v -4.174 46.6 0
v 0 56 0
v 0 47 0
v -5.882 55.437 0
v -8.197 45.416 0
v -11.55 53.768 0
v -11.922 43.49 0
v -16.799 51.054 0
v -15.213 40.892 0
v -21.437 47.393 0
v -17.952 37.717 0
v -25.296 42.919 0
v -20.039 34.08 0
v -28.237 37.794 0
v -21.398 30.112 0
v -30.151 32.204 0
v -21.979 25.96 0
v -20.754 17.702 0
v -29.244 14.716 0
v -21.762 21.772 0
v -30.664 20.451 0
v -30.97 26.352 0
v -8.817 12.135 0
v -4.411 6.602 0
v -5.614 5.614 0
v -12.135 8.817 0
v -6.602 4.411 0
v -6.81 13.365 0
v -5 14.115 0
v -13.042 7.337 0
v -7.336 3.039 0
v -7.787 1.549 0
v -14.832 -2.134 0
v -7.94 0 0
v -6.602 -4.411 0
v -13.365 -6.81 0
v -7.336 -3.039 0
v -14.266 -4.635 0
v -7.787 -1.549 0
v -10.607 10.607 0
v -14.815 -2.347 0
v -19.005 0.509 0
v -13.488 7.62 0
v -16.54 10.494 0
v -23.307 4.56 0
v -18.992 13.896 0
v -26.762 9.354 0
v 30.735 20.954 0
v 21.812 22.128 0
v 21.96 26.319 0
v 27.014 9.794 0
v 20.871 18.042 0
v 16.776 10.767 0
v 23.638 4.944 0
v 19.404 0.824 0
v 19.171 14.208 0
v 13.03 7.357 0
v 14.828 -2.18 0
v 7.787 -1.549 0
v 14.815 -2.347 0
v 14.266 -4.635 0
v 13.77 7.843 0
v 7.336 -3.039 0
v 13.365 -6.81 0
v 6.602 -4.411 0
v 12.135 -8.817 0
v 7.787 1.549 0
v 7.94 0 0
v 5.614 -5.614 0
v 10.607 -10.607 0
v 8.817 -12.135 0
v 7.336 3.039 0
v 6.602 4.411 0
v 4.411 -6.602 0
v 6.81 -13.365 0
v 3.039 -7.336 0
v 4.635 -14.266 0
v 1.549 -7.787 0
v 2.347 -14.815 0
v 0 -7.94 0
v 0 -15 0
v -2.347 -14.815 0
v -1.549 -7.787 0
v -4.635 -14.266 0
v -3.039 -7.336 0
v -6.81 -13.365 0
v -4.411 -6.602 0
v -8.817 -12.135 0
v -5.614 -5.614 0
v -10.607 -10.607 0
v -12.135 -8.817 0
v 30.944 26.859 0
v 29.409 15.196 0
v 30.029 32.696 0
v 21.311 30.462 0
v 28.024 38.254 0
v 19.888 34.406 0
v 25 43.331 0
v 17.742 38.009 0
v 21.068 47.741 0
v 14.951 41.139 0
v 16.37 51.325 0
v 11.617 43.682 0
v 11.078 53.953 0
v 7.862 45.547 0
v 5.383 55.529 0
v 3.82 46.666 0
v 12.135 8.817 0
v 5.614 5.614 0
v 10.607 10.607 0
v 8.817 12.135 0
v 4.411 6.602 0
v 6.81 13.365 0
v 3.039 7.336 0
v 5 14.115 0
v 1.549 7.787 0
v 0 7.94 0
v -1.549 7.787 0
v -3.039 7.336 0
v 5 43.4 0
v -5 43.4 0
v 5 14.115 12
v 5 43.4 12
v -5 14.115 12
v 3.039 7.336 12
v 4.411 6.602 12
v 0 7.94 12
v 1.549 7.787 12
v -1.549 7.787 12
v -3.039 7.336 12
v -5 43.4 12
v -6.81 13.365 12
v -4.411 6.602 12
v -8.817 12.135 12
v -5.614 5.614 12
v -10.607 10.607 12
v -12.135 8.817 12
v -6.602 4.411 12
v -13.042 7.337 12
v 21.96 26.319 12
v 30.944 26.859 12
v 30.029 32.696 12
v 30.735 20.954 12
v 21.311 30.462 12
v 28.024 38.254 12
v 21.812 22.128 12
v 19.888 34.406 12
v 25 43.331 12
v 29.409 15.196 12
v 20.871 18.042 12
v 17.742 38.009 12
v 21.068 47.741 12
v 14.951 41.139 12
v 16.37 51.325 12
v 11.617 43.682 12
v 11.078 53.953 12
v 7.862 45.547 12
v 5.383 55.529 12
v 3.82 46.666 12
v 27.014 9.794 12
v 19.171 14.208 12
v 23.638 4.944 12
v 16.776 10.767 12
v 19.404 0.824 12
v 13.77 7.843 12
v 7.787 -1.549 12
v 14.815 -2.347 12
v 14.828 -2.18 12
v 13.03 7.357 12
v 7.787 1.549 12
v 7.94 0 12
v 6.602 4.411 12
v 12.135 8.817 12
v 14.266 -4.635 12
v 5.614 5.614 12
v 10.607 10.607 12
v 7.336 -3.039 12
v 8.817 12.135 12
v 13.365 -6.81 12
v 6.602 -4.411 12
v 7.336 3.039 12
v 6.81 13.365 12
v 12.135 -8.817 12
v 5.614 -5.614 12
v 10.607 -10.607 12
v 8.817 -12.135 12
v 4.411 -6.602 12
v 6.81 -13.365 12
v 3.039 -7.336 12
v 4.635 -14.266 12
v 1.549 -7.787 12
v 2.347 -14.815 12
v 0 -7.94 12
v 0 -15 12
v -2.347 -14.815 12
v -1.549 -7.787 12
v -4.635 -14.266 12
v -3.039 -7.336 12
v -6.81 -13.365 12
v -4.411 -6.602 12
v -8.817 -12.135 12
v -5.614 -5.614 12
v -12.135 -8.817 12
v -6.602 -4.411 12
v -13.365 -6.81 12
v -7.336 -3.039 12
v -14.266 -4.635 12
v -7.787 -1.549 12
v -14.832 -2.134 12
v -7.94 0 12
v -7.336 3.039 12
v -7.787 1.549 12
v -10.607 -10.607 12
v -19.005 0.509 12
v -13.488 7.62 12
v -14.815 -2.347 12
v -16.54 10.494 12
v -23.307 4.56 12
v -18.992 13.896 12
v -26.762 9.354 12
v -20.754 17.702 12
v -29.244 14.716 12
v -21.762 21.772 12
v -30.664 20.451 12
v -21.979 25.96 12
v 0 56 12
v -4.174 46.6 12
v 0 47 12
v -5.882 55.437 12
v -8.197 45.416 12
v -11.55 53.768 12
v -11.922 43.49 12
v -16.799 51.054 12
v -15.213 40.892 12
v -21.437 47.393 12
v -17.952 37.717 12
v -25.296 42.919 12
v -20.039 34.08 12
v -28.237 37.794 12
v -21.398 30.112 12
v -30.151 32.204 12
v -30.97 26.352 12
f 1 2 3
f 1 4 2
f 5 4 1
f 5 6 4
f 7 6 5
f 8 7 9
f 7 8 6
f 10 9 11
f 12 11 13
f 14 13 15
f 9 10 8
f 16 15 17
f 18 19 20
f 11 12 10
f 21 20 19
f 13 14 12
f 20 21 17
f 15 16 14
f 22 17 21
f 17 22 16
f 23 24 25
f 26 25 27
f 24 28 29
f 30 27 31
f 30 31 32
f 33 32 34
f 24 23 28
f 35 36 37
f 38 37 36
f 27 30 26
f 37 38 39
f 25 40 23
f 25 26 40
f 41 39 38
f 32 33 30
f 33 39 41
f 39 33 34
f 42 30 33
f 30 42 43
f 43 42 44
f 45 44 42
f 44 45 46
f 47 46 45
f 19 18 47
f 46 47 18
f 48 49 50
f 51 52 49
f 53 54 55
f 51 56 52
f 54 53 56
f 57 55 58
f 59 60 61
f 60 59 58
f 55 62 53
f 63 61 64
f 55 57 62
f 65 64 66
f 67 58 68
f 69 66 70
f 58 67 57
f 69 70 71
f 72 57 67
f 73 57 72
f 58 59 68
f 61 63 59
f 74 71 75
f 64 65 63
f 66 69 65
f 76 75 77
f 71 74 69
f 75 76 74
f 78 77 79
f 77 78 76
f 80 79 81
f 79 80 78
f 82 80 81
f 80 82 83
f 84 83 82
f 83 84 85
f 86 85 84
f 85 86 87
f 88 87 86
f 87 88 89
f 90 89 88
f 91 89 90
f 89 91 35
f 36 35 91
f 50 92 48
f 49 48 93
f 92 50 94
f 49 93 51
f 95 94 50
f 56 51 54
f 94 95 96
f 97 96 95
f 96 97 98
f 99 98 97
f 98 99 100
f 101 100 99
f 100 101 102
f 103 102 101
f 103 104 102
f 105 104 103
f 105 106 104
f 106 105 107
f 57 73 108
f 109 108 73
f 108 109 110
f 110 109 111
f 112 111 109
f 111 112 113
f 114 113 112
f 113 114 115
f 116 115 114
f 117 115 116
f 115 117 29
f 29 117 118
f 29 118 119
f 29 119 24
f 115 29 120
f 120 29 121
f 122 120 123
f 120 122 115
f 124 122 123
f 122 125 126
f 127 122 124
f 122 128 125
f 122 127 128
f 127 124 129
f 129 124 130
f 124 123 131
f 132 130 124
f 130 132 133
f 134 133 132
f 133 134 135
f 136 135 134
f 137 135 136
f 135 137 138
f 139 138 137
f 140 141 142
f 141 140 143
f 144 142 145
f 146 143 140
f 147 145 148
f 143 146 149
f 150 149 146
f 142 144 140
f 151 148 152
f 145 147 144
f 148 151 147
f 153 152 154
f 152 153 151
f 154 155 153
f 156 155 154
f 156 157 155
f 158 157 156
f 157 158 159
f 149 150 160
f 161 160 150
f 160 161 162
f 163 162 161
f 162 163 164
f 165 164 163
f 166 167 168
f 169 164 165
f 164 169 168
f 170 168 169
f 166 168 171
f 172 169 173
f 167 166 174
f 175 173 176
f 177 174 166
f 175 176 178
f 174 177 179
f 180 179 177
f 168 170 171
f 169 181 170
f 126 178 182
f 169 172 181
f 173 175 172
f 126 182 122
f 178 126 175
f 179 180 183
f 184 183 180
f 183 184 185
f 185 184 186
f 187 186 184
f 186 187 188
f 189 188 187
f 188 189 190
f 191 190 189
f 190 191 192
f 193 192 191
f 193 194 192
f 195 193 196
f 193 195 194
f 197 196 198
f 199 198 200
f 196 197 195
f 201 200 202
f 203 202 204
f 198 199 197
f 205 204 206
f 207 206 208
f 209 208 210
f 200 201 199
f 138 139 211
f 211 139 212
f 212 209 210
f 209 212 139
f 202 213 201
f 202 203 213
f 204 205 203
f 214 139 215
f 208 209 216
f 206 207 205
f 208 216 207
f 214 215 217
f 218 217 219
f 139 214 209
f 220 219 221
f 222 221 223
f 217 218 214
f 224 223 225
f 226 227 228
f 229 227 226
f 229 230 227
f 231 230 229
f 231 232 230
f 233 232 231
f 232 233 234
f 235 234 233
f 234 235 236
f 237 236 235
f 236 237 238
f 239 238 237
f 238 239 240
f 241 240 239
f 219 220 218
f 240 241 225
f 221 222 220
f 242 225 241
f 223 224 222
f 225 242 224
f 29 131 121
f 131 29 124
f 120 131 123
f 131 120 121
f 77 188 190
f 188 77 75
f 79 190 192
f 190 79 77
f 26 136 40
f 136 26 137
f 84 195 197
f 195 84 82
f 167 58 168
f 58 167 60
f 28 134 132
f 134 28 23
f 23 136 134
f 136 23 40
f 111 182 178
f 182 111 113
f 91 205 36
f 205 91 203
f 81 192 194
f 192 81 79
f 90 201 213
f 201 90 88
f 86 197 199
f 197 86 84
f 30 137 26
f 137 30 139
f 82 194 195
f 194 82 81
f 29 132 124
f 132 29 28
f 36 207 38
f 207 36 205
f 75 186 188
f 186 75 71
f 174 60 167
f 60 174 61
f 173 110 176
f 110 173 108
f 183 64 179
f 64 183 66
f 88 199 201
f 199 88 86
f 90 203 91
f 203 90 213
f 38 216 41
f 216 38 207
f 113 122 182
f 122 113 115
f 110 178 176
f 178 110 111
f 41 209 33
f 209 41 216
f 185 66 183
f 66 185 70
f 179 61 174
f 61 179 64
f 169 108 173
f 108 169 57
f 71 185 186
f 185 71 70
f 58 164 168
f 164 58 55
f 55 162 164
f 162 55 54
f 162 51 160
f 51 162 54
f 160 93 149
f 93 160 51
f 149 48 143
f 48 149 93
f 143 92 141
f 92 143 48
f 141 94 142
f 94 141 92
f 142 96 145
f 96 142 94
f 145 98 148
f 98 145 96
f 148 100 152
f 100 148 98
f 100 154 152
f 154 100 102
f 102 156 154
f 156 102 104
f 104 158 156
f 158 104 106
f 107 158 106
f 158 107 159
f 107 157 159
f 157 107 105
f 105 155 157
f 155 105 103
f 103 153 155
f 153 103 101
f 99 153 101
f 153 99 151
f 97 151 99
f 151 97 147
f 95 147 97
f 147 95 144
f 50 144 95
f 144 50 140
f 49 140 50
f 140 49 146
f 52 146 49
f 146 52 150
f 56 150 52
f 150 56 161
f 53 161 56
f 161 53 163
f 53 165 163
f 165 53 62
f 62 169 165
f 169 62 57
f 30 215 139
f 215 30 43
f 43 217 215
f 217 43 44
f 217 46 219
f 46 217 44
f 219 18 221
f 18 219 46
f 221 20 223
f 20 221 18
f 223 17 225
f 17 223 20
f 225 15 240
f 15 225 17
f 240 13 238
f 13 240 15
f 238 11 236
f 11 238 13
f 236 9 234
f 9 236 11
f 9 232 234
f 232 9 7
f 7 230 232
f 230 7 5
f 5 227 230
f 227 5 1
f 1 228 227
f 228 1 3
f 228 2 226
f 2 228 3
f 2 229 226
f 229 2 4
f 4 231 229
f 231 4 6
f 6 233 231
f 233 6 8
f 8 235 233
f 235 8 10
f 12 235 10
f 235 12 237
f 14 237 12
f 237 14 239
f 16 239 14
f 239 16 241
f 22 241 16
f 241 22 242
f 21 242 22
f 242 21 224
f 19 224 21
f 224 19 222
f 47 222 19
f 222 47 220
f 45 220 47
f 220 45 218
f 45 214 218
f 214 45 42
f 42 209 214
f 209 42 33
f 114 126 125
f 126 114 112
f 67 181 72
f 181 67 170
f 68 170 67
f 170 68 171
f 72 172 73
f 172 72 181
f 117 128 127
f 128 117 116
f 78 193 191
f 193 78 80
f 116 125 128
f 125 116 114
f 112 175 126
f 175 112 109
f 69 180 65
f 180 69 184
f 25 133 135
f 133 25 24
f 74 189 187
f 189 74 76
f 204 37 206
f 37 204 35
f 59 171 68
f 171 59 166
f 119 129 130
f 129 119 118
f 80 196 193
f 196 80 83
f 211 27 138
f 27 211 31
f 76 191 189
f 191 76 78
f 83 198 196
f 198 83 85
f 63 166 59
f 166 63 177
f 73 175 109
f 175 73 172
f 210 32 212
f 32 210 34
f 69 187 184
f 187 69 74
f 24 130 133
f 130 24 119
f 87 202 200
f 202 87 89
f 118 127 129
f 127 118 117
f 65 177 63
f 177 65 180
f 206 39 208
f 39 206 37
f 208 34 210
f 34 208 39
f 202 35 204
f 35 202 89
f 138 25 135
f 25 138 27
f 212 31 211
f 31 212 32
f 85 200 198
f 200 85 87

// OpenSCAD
$fn = 32;

// ----------------------------------------------------------------------
// Hook: 50 mm shank into a 22 mm curl, 12 mm thick
// ----------------------------------------------------------------------

// --- parameters (mm) ---
shank_len = 50;           // shank length from the boss centre
shank_w = 10;             // shank width
boss_d = 30;              // boss diameter
bore_d = 15.88;           // boss bore
curl_in = 22;             // curl inner radius
curl_out = 31;            // curl outer radius
curl_sweep = 350;         // curl sweep angle
hook_t = 12;              // hook thickness

shank_profile = [[-5, 43.4], [5, 43.4], [5, 13], [-5, 13]];
boss_profile = [[15, 0], [14.815, 2.347], [14.266, 4.635], [13.365, 6.81], [12.135, 8.817], [10.607, 10.607], [8.817, 12.135], [6.81, 13.365], [4.635, 14.266], [2.347, 14.815], [0, 15], [-2.347, 14.815], [-4.635, 14.266], [-6.81, 13.365], [-8.817, 12.135], [-10.607, 10.607], [-12.135, 8.817], [-13.365, 6.81], [-14.266, 4.635], [-14.815, 2.347], [-15, 0], [-14.815, -2.347], [-14.266, -4.635], [-13.365, -6.81], [-12.135, -8.817], [-10.607, -10.607], [-8.817, -12.135], [-6.81, -13.365], [-4.635, -14.266], [-2.347, -14.815], [0, -15], [2.347, -14.815], [4.635, -14.266], [6.81, -13.365], [8.817, -12.135], [10.607, -10.607], [12.135, -8.817], [13.365, -6.81], [14.266, -4.635], [14.815, -2.347]];
curl_profile = [[0, 56], [-5.882, 55.437], [-11.55, 53.768], [-16.799, 51.054], [-21.437, 47.393], [-25.296, 42.919], [-28.237, 37.794], [-30.151, 32.204], [-30.97, 26.352], [-30.664, 20.451], [-29.244, 14.716], [-26.762, 9.354], [-23.307, 4.56], [-19.005, 0.509], [-14.013, -2.652], [-8.512, -4.808], [-2.702, -5.882], [3.207, -5.834], [8.999, -4.665], [14.464, -2.419], [19.404, 0.824], [23.638, 4.944], [27.014, 9.794], [29.409, 15.196], [30.735, 20.954], [30.944, 26.859], [30.029, 32.696], [28.024, 38.254], [25, 43.331], [21.068, 47.741], [16.37, 51.325], [11.078, 53.953], [5.383, 55.529], [3.82, 46.666], [7.862, 45.547], [11.617, 43.682], [14.951, 41.139], [17.742, 38.009], [19.888, 34.406], [21.311, 30.462], [21.96, 26.319], [21.812, 22.128], [20.871, 18.042], [19.171, 14.208], [16.776, 10.767], [13.77, 7.843], [10.265, 5.541], [6.386, 3.947], [2.276, 3.118], [-1.917, 3.084], [-6.041, 3.846], [-9.945, 5.376], [-13.488, 7.62], [-16.54, 10.494], [-18.992, 13.896], [-20.754, 17.702], [-21.762, 21.772], [-21.979, 25.96], [-21.398, 30.112], [-20.039, 34.08], [-17.952, 37.717], [-15.213, 40.892], [-11.922, 43.49], [-8.197, 45.416], [-4.174, 46.6], [0, 47]];

difference() {
  union() {
    /* three overlapping outlines: shank, boss and the smooth curl */
    linear_extrude(height = hook_t) polygon(shank_profile);
    linear_extrude(height = hook_t) polygon(boss_profile);
    linear_extrude(height = hook_t) polygon(curl_profile);
  }
  translate([0, 0, -2.5]) cylinder(h = hook_t + 5, d = bore_d);
}
